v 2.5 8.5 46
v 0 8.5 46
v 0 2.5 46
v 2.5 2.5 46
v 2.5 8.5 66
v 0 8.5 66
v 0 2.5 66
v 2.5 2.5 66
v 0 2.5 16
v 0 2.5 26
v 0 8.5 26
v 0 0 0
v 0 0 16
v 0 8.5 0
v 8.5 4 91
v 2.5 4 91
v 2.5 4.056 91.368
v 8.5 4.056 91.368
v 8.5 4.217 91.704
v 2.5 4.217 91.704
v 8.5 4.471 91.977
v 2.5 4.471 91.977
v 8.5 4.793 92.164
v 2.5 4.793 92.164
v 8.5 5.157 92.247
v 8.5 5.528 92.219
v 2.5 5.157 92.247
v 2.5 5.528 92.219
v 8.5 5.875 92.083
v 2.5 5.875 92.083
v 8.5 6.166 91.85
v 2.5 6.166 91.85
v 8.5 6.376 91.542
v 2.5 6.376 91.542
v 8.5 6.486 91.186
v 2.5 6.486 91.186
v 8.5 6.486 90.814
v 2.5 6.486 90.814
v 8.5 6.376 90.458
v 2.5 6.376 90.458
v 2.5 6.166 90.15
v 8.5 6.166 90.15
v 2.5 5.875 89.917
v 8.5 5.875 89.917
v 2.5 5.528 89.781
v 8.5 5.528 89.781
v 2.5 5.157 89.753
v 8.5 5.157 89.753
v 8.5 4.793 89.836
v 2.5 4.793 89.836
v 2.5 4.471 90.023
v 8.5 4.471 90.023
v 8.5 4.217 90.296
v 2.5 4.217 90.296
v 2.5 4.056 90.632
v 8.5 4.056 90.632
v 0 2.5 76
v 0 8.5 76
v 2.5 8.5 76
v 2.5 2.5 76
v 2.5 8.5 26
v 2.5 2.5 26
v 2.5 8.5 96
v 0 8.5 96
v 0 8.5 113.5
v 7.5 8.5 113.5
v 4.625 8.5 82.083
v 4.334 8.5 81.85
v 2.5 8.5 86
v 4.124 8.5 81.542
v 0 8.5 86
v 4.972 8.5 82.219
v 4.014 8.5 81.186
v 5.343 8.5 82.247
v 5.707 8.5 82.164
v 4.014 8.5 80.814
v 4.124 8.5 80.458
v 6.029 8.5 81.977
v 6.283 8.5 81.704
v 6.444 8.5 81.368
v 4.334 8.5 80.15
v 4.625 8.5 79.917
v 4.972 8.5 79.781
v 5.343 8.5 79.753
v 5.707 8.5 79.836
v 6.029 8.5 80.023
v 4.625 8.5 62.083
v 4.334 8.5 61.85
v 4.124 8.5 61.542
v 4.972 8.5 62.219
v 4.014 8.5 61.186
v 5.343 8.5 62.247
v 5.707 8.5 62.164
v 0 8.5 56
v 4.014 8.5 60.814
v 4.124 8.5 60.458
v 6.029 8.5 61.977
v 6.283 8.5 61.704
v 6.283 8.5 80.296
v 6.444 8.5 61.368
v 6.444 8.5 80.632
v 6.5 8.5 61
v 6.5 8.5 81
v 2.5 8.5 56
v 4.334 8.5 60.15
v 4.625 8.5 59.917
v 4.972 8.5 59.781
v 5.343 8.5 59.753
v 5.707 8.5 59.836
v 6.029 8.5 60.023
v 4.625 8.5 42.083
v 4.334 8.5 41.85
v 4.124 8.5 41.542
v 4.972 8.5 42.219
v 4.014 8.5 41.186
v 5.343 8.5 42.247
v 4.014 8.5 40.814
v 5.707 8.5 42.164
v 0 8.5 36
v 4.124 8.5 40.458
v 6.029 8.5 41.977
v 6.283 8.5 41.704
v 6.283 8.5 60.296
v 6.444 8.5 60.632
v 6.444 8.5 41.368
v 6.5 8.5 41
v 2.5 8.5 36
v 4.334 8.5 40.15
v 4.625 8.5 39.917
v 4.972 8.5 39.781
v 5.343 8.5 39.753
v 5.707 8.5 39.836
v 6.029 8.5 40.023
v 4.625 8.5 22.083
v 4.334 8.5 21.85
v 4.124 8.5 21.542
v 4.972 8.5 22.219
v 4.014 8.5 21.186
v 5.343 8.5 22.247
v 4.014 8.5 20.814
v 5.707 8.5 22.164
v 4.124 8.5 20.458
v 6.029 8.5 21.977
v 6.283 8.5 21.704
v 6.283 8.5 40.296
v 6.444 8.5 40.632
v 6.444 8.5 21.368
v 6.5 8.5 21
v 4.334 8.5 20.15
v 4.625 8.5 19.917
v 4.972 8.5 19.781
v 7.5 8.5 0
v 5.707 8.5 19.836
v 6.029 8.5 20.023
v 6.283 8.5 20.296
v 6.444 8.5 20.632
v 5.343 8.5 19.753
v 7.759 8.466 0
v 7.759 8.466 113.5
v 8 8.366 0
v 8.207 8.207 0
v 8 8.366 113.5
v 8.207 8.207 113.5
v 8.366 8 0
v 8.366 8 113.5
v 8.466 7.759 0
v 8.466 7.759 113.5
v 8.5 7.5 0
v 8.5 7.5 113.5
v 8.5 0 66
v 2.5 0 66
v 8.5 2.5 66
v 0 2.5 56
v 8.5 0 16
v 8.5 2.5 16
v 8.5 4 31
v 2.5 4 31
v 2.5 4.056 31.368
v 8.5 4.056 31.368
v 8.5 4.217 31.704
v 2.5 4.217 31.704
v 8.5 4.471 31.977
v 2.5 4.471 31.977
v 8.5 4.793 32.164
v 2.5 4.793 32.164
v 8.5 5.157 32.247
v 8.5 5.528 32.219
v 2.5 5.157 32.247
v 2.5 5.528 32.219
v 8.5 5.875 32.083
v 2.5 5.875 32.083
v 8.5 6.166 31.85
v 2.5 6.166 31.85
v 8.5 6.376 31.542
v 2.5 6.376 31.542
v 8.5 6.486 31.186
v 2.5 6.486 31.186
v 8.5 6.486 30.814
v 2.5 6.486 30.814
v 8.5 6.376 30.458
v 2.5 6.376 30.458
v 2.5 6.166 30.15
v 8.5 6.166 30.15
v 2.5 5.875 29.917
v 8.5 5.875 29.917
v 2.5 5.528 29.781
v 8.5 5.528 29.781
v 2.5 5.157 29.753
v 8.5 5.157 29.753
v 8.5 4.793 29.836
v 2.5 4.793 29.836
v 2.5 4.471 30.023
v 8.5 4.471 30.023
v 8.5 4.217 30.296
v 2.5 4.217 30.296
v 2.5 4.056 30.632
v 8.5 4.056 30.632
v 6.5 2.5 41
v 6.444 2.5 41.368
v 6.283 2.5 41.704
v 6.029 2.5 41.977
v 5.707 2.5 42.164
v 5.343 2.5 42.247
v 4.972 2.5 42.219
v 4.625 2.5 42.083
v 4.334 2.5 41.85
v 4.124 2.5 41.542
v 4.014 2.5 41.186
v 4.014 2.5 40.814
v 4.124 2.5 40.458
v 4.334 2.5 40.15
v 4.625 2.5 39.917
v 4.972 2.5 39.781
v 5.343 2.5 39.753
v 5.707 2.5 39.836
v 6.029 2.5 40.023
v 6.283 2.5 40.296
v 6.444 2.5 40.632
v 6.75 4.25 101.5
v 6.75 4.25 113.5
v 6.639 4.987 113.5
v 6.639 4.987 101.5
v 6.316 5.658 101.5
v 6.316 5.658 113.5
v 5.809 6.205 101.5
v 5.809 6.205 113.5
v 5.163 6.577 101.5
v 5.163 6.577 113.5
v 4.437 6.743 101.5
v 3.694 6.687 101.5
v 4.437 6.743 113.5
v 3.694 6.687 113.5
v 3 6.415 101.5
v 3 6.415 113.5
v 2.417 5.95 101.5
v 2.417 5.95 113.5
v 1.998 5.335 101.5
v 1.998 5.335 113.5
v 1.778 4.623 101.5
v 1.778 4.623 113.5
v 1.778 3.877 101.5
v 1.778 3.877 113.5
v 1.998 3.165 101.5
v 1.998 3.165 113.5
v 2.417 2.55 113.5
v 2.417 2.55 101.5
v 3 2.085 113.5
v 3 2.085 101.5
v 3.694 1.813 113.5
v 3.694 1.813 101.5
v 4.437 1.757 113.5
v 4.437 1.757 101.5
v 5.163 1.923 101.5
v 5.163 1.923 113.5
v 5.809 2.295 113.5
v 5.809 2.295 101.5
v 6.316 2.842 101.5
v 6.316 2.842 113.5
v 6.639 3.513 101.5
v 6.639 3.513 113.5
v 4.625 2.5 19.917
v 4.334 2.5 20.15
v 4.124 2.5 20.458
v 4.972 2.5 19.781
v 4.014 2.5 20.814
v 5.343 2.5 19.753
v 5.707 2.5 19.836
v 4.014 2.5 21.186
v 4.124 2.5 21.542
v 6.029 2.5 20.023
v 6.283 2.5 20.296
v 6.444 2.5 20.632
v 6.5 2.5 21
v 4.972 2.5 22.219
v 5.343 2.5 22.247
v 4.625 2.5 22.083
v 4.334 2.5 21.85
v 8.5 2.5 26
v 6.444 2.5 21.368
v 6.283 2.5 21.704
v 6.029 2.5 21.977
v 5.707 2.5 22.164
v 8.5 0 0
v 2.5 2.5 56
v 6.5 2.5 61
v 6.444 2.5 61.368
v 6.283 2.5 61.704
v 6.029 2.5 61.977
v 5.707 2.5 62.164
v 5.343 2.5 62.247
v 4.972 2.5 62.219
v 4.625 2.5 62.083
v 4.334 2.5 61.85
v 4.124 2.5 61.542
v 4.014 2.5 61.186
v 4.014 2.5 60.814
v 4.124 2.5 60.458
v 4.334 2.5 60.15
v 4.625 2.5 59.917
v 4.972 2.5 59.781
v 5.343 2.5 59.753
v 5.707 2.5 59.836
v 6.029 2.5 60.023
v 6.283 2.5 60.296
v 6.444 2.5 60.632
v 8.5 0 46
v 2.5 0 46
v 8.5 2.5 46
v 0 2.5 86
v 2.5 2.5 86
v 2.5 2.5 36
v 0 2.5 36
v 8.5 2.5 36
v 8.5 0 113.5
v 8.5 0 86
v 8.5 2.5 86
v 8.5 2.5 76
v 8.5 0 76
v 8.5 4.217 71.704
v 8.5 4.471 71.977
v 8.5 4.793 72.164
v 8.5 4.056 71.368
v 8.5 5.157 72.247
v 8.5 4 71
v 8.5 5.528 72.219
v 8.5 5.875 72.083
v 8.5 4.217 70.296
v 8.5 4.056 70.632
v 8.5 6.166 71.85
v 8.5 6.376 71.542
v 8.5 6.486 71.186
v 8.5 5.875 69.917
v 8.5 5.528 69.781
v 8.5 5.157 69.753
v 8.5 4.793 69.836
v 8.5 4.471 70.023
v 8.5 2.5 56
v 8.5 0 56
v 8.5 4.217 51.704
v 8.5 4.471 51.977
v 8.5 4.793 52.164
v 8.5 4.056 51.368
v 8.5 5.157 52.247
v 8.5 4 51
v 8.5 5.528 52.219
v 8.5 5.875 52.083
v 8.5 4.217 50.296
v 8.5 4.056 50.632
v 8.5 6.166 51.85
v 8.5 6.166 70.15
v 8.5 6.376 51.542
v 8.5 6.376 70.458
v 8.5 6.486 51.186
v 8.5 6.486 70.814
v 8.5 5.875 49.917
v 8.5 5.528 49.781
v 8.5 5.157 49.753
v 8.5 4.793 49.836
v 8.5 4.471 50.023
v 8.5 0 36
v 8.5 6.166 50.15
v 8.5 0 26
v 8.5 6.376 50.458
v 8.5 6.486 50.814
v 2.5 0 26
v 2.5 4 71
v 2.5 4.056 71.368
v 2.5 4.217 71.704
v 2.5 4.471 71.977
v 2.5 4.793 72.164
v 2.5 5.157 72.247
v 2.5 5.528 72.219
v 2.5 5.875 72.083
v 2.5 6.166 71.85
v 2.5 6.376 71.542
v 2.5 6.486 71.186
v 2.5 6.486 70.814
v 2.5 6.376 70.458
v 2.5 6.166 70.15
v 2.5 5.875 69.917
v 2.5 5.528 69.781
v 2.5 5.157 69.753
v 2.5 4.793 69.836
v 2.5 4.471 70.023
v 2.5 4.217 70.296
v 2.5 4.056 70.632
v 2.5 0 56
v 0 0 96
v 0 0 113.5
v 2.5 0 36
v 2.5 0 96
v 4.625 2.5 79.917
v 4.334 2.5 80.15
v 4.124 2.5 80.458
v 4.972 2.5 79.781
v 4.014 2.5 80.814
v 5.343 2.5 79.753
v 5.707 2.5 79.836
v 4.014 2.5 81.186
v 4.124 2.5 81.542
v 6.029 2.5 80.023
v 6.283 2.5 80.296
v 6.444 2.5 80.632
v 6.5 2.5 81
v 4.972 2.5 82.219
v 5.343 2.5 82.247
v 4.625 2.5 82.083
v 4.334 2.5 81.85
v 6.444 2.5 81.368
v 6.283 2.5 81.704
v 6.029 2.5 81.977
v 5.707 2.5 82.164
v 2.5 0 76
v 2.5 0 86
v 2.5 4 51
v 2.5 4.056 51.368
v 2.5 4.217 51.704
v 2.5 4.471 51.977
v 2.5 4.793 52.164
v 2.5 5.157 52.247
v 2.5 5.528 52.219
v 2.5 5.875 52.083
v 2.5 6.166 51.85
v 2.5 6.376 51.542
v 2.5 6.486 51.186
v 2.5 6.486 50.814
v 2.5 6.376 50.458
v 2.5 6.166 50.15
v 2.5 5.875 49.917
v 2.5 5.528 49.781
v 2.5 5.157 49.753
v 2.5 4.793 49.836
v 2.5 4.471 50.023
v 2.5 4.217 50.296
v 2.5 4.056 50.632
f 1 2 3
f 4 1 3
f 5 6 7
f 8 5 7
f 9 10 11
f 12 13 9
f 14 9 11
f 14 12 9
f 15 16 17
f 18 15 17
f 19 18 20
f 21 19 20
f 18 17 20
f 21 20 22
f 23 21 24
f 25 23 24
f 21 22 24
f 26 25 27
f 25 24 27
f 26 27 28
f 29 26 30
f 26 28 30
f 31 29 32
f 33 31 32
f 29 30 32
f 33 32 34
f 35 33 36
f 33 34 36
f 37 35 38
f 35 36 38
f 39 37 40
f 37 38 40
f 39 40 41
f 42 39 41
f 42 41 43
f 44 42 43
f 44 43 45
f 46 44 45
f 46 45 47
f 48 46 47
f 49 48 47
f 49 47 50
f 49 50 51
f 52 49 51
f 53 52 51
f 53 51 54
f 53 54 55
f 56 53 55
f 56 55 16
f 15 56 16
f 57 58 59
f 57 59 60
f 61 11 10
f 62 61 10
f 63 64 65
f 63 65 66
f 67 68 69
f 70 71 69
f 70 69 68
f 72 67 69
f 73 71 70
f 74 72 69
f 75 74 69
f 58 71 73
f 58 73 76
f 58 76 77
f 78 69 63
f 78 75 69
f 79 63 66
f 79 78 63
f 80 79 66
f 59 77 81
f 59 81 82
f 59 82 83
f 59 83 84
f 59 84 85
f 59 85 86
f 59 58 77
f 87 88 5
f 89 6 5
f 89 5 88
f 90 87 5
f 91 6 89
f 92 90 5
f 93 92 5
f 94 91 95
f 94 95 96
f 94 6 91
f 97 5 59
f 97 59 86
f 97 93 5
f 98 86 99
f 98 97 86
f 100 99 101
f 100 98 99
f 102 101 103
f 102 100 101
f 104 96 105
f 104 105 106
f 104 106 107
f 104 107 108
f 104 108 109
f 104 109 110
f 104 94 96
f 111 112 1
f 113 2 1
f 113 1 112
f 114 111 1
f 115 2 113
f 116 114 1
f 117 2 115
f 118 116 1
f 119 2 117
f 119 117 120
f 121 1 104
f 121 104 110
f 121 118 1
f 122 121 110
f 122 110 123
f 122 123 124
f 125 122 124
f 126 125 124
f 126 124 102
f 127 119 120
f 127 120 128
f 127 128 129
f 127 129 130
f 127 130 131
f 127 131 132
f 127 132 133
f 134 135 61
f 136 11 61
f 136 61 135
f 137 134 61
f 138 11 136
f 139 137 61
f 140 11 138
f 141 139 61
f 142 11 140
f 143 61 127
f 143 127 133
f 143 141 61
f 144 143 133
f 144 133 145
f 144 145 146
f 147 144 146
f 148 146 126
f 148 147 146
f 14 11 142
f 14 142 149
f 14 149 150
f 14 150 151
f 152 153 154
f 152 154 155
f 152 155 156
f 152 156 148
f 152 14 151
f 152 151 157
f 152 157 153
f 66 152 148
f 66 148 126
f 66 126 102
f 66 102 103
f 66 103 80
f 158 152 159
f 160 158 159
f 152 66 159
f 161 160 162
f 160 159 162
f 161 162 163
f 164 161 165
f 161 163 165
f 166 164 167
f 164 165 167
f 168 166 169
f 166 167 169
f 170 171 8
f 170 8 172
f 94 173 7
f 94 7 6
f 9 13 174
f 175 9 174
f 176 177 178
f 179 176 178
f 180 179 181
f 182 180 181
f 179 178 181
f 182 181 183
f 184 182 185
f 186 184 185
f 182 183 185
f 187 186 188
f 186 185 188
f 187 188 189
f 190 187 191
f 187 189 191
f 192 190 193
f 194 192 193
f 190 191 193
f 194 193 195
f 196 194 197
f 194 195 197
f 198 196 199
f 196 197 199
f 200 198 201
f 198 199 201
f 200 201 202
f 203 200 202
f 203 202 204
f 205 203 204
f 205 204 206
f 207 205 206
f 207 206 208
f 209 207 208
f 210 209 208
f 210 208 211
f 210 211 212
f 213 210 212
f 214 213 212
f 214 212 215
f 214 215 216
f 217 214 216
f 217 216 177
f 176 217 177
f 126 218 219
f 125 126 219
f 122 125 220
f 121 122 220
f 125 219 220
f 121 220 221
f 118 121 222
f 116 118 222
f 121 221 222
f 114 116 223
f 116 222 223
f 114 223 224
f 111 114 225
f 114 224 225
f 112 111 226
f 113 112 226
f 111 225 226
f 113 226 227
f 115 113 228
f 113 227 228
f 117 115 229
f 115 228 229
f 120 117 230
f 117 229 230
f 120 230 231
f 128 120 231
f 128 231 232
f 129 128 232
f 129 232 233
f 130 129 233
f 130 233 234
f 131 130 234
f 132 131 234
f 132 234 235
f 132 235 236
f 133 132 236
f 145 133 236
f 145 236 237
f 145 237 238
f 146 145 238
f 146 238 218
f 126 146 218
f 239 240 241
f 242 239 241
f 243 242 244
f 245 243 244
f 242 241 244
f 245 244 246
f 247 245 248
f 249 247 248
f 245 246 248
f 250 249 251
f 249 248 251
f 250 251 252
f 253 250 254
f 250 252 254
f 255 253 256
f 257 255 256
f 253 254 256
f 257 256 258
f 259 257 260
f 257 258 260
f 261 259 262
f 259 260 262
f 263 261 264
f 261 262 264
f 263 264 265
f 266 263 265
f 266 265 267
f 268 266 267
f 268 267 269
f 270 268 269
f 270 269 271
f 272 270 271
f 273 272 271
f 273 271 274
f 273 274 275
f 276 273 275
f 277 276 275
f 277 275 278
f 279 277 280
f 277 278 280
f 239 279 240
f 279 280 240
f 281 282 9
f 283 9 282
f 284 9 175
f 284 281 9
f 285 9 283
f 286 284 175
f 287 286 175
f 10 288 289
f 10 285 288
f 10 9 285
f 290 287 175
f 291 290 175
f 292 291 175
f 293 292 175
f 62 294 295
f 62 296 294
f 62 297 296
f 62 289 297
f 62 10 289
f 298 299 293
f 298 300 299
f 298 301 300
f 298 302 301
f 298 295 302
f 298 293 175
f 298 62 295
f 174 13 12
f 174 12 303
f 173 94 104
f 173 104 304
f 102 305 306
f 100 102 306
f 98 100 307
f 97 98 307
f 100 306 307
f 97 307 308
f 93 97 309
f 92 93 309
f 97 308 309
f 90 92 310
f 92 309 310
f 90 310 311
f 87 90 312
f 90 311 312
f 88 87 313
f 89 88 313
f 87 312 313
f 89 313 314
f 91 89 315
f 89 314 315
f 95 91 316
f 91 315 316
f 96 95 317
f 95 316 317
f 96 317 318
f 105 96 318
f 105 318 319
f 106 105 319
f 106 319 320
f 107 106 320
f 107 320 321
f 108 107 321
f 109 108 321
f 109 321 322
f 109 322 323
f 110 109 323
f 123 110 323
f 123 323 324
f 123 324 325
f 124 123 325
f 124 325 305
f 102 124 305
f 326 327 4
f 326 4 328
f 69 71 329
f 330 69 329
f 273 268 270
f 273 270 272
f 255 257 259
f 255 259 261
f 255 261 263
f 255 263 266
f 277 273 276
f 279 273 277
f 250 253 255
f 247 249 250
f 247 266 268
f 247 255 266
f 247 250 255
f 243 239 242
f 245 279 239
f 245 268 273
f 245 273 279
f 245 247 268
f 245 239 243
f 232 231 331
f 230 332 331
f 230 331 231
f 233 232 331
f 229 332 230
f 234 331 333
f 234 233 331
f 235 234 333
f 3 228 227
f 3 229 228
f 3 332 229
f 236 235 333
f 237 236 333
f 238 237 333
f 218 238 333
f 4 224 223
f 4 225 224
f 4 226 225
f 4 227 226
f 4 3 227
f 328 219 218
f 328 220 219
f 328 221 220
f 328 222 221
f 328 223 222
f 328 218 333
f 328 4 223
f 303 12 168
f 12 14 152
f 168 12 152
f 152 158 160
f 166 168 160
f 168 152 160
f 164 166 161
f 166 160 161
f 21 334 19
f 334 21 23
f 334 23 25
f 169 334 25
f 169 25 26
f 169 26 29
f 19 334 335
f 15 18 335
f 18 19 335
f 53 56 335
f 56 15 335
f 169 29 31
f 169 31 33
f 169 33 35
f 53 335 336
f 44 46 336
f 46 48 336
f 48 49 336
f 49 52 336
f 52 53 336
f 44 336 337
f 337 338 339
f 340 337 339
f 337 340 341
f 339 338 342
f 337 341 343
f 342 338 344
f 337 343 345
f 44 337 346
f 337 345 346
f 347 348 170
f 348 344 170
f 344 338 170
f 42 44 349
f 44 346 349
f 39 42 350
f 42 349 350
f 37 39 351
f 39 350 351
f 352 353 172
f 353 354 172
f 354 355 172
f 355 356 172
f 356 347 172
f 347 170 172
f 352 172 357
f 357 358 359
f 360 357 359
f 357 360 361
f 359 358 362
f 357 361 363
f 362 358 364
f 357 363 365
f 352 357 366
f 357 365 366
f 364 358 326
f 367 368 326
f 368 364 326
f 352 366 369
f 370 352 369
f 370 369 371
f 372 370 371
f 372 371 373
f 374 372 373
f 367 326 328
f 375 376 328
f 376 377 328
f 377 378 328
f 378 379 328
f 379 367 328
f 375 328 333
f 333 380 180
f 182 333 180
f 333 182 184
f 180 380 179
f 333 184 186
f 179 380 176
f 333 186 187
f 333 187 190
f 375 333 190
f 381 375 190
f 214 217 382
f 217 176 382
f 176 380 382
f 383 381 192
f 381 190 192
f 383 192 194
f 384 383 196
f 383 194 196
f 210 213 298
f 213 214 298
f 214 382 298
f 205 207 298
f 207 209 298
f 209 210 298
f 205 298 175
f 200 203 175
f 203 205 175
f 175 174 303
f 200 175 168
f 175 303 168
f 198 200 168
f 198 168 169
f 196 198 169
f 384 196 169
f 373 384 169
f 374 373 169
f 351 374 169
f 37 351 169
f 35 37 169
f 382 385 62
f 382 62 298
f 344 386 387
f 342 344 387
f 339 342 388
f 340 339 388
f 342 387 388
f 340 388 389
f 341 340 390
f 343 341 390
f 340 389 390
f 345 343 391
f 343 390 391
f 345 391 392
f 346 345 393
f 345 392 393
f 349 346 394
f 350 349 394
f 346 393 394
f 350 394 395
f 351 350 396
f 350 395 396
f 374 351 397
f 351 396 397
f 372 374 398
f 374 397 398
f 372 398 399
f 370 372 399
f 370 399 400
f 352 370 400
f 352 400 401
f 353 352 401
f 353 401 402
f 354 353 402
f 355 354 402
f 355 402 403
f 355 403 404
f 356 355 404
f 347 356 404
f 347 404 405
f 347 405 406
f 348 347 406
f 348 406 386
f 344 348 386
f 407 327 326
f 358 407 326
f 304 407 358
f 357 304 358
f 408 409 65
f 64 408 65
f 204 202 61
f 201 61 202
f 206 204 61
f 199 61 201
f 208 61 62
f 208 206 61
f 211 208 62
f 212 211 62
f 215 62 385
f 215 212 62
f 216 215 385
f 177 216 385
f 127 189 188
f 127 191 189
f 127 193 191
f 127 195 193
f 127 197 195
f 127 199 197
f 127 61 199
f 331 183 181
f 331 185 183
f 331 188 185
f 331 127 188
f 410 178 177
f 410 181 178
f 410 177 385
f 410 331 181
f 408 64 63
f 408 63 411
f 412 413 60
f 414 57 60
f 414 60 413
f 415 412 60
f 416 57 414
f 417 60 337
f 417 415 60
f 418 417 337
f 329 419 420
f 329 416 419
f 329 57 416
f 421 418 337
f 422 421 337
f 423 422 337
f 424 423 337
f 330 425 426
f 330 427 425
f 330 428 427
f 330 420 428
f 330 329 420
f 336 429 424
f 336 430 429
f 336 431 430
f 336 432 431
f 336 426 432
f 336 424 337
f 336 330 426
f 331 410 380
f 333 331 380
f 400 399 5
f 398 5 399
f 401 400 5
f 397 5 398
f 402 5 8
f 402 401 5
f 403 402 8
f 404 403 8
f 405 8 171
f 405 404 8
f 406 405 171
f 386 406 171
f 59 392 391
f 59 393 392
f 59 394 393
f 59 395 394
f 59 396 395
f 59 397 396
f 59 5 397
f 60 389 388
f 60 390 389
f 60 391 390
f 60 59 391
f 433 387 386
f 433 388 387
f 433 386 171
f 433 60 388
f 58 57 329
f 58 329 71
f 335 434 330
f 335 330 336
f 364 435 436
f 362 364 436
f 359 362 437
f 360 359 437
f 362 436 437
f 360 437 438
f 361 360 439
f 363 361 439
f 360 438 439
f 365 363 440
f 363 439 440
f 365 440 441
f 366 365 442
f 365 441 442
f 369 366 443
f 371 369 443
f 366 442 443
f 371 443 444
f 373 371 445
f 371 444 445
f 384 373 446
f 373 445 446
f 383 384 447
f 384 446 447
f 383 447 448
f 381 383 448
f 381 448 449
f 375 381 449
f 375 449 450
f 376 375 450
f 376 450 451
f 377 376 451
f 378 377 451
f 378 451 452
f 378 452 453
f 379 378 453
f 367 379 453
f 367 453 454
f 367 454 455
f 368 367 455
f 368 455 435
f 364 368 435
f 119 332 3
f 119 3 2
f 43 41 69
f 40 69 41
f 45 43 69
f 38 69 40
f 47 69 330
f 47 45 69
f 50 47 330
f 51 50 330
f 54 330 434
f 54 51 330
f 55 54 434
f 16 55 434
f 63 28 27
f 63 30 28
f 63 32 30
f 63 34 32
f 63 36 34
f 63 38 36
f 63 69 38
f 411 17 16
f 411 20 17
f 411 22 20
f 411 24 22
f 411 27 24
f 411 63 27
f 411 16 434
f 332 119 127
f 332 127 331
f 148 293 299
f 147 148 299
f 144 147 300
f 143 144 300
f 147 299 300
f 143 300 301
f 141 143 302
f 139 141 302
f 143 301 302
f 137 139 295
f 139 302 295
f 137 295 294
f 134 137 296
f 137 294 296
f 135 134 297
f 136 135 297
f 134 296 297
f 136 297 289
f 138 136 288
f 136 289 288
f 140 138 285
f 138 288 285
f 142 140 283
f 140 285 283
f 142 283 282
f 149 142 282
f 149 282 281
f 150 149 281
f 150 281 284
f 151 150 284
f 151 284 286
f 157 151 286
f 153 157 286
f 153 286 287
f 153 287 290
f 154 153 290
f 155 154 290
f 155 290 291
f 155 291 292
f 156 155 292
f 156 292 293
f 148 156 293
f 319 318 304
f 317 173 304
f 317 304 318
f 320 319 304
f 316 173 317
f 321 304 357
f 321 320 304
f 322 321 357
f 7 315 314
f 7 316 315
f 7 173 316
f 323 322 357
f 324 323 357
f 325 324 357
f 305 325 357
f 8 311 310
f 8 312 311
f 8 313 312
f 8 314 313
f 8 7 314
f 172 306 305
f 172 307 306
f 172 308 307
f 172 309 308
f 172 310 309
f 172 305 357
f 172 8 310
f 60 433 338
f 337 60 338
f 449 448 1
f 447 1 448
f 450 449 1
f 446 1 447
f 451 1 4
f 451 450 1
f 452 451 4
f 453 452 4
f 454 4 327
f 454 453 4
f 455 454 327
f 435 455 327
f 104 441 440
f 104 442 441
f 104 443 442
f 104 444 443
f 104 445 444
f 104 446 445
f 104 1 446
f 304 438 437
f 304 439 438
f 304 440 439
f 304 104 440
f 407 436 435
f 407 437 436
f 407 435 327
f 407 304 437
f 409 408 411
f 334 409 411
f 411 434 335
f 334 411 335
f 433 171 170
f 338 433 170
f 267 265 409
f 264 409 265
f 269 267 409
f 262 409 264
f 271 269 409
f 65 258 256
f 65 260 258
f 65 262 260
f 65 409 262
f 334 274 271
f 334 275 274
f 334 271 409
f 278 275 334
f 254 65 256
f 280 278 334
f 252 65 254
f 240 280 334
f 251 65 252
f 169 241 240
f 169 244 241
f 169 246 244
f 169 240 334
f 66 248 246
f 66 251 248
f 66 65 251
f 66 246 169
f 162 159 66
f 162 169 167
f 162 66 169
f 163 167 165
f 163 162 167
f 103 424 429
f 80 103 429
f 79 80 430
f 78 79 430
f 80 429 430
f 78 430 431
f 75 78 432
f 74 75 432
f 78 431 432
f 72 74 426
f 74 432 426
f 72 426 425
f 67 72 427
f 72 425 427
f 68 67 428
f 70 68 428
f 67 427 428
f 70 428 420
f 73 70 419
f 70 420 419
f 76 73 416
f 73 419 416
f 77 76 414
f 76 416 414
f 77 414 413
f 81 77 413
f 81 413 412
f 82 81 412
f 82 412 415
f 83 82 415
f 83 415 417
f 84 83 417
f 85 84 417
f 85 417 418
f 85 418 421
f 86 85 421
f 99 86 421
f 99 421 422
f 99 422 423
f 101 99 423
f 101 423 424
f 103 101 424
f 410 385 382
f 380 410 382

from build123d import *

# Parameters (mm, degrees)
SKETCH_W               = 8.5
SKETCH_H               = 8.5
PAD_DEPTH              = 113.5
SKETCH001_W            = 10
SKETCH001_H            = 10
POCKET_DEPTH           = 2.5
LINEARPATTERN_COUNT    = 4
LINEARPATTERN_PITCH    = 20
SKETCH002_W            = 10
SKETCH002_H            = 10
POCKET001_DEPTH        = 2.5
LINEARPATTERN001_COUNT = 4
LINEARPATTERN001_PITCH = 20
FILLET_R               = 1
SKETCH003_R            = 1.25
POCKET002_DEPTH        = 6.001
LINEARPATTERN002_COUNT = 4
LINEARPATTERN002_PITCH = 20
SKETCH004_R            = 1.25
POCKET003_DEPTH        = 6.001
LINEARPATTERN003_COUNT = 4
LINEARPATTERN003_PITCH = 20
SKETCH005_R            = 2.5
POCKET004_DEPTH        = 12


with BuildPart() as part:
    # Sketch → Pad (new body)
    with BuildSketch(Plane.XY):
        with Locations((4.25, 4.25)):
            Rectangle(SKETCH_W, SKETCH_H)
    extrude(amount=PAD_DEPTH)

    # Sketch001 → Pocket (cut)
    with BuildSketch(Plane.XZ):
        with Locations((4.410969, 21)):
            Rectangle(SKETCH001_W, SKETCH001_H)
    pocket = extrude(amount=-POCKET_DEPTH, mode=Mode.SUBTRACT)

    # LinearPattern: Pocket ×4
    with Locations(*[(0, 0, i * LINEARPATTERN_PITCH) for i in range(1, LINEARPATTERN_COUNT)]):
        add(pocket, mode=Mode.SUBTRACT)

    # Sketch002 → Pocket001 (cut)
    with BuildSketch(Plane(origin=(0, 0, 0), x_dir=(0, -1, 0), z_dir=(-1, 0, 0))):
        with Locations((-4.326825, 31)):
            Rectangle(SKETCH002_W, SKETCH002_H)
    pocket001 = extrude(amount=-POCKET001_DEPTH, mode=Mode.SUBTRACT)

    # LinearPattern001: Pocket001 ×4
    with Locations(*[(0, 0, i * LINEARPATTERN001_PITCH) for i in range(1, LINEARPATTERN001_COUNT)]):
        add(pocket001, mode=Mode.SUBTRACT)

    # Fillet
    fillet_edges = [part.edges().sort_by_distance(p)[0] for p in [
        (8.5, 8.5, 56.75),
    ]]
    fillet(fillet_edges, radius=FILLET_R)

    # Sketch003 → Pocket002 (cut, through all)
    with BuildSketch(Plane.XZ.offset(-2.5)):
        with Locations((5.25, 21)):
            Circle(SKETCH003_R)
    pocket002 = extrude(amount=-POCKET002_DEPTH, mode=Mode.SUBTRACT)

    # LinearPattern002: Pocket002 ×4
    with Locations(*[(0, 0, i * LINEARPATTERN002_PITCH) for i in range(1, LINEARPATTERN002_COUNT)]):
        add(pocket002, mode=Mode.SUBTRACT)

    # Sketch004 → Pocket003 (cut, through all)
    with BuildSketch(Plane(origin=(2.5, 0, 0), x_dir=(0, -1, 0), z_dir=(-1, 0, 0))):
        with Locations((-5.25, 31)):
            Circle(SKETCH004_R)
    pocket003 = extrude(amount=-POCKET003_DEPTH, mode=Mode.SUBTRACT)

    # LinearPattern003: Pocket003 ×4
    with Locations(*[(0, 0, i * LINEARPATTERN003_PITCH) for i in range(1, LINEARPATTERN003_COUNT)]):
        add(pocket003, mode=Mode.SUBTRACT)

    # Sketch005 → Pocket004 (cut)
    with BuildSketch(Plane.XY.offset(113.5)):
        with Locations((4.25, 4.25)):
            Circle(SKETCH005_R)
    extrude(amount=-POCKET004_DEPTH, mode=Mode.SUBTRACT)


solid = part.part
